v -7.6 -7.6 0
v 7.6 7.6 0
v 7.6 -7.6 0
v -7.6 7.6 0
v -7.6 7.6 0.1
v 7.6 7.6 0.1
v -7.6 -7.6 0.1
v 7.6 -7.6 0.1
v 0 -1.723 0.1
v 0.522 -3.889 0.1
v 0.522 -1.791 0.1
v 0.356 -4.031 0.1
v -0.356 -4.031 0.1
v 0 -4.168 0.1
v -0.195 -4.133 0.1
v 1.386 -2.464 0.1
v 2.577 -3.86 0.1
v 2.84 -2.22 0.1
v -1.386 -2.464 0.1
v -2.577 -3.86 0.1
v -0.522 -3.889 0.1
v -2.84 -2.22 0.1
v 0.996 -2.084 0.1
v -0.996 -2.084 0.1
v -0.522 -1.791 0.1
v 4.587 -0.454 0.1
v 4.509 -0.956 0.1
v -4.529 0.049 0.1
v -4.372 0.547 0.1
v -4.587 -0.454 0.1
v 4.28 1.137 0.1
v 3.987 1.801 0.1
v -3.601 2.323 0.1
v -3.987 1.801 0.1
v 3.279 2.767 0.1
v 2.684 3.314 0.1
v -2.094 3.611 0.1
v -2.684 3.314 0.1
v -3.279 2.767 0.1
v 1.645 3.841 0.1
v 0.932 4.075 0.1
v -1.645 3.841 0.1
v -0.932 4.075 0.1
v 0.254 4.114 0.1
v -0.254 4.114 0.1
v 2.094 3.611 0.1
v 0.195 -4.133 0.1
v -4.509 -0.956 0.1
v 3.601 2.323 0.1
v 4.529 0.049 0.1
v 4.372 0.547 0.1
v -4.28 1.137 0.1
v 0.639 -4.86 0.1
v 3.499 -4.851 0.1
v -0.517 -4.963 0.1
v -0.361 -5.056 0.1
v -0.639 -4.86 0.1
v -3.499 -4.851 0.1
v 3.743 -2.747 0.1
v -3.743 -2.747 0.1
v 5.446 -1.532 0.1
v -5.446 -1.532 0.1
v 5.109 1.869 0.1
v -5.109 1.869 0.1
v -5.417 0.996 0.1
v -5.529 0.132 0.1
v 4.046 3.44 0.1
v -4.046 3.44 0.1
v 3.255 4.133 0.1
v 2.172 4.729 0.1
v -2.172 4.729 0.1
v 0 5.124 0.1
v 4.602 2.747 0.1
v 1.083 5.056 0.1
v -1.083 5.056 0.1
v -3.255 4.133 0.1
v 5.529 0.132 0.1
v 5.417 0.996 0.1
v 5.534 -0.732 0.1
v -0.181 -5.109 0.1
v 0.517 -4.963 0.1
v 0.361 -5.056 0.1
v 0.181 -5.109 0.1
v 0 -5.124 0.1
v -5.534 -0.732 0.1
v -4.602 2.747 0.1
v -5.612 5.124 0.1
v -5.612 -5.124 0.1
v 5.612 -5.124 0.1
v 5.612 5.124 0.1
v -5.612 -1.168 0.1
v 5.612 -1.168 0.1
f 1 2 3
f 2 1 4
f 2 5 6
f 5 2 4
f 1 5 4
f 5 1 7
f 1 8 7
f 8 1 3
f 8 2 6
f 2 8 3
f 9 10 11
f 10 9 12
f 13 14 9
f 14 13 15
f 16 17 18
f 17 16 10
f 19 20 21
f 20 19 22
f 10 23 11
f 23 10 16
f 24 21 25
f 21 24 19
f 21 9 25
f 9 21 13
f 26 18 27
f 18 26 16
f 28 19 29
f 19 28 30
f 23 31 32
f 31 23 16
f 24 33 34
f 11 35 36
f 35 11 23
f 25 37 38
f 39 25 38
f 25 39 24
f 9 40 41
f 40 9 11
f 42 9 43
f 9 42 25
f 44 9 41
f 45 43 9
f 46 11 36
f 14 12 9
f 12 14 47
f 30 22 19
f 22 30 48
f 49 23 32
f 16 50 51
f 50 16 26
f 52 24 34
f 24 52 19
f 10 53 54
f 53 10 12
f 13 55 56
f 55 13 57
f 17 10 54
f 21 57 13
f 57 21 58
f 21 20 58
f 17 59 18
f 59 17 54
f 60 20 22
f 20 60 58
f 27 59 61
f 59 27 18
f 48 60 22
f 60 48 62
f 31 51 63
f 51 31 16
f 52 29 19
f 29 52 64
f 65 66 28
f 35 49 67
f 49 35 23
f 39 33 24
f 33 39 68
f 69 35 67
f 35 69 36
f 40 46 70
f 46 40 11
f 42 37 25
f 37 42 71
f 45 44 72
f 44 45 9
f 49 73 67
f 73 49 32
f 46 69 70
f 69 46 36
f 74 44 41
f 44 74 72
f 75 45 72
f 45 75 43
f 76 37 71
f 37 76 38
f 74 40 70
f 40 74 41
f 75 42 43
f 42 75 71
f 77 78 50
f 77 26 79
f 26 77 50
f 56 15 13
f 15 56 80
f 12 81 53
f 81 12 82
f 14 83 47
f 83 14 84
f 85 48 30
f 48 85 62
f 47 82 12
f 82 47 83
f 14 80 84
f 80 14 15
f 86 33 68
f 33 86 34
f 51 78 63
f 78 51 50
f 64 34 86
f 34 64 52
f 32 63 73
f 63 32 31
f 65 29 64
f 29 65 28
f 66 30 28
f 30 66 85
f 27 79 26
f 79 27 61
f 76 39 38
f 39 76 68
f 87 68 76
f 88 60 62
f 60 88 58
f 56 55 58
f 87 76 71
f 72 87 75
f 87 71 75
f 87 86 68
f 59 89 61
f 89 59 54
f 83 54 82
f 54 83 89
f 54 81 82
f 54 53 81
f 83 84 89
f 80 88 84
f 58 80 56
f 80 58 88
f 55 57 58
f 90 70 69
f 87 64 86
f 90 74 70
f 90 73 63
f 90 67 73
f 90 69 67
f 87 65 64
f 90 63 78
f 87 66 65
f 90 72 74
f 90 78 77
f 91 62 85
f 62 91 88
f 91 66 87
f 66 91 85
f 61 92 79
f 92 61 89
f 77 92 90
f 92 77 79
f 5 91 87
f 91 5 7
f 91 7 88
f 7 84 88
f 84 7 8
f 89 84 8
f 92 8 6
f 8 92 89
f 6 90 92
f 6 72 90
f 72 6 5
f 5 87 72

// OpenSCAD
// file: ../p/box5-12.scad
use <../lib.scad>
function ldraw_lib__box5_12() = [
// 0 Box with 5 Faces without Any Edges
// 0 Name: box5-12.dat
// 0 Author: Chris Dee [cwdee]
// 0 !LDRAW_ORG Primitive UPDATE 2009-02
// 0 !LICENSE Licensed under CC BY 2.0 and CC BY 4.0 : see CAreadme.txt
// 
// 0 BFC CERTIFY CCW
  [0,"BFC","CERTIFY"],
  [0,"BFC","CCW"],
// 
// 0 !HISTORY 2009-09-03 [PTadmin] Official Update 2009-02
// 
// 
// 4 16 1 1 1 1 1 -1 -1 1 -1 -1 1 1
  [4,16,1,1,1,1,1,-1,-1,1,-1,-1,1,1],
// 4 16 -1 0 1 1 0 1 1 1 1 -1 1 1
  [4,16,-1,0,1,1,0,1,1,1,1,-1,1,1],
// 4 16 -1 0 -1 -1 0 1 -1 1 1 -1 1 -1
  [4,16,-1,0,-1,-1,0,1,-1,1,1,-1,1,-1],
// 4 16 1 0 -1 -1 0 -1 -1 1 -1 1 1 -1
  [4,16,1,0,-1,-1,0,-1,-1,1,-1,1,1,-1],
// 4 16 1 0 1 1 0 -1 1 1 -1 1 1 1
  [4,16,1,0,1,1,0,-1,1,1,-1,1,1,1],
// 0
];
module ldraw_lib__box5_12(step=0, col=false, unit=2/5, alt=false, line=0.2, solid=!$preview)
    makepoly(ldraw_lib__box5_12(), step=step, col=col, unit=unit, alt=alt, line=line, solid=solid);
ldraw_lib__box5_12(line=0.2);
// file: 004695b.scad
use <../lib.scad>
use <../p/box5-12.scad>
use <s/3004s60.scad>
function ldraw_lib__004695b() = [
// 0 Sticker  1.9 x  1.9 with Shell Logo
// 0 Name: 004695b.dat
// 0 Author: J.C. Tchang [tchang]
// 0 !LDRAW_ORG Part UPDATE 2014-01
// 0 !LICENSE Licensed under CC BY 2.0 and CC BY 4.0 : see CAreadme.txt
// 
// 0 BFC CERTIFY CCW
  [0,"BFC","CERTIFY"],
  [0,"BFC","CCW"],
// 
// 0 !KEYWORDS Set 377
// 
// 0 !HISTORY 2014-06-21 [PTadmin] Official Update 2014-01
// 
// 
// 1 16 0 -0.25 0 19 0 0 0 0.25 0 0 0 19 box5-12.dat
  [1,16,0,-0.25,0,19,0,0,0,0.25,0,0,0,19, ldraw_lib__box5_12()],
// 1 15 0 -0.25 0 1.22 0 0 0 0 1 0 -1.22 0 s\3004s60.dat
  [1,15,0,-0.25,0,1.22,0,0,0,0,1,0,-1.22,0, ldraw_lib__s__3004s60()],
// 
// 4 15 -14.03 -0.25 -2.92068 -14.03 -0.25 12.81 -19 -0.25 19 -19 -0.25 -19
  [4,15,-14.03,-0.25,-2.92068,-14.03,-0.25,12.81,-19,-0.25,19,-19,-0.25,-19],
// 3 15 -14.03 -0.25 -2.92068 -19 -0.25 -19 -14.03 -0.25 -12.81
  [3,15,-14.03,-0.25,-2.92068,-19,-0.25,-19,-14.03,-0.25,-12.81],
// 4 15 0 -0.25 -12.81 -14.03 -0.25 -12.81 -19 -0.25 -19 19 -0.25 -19
  [4,15,0,-0.25,-12.81,-14.03,-0.25,-12.81,-19,-0.25,-19,19,-0.25,-19],
// 3 15 14.03 -0.25 -12.81 0 -0.25 -12.81 19 -0.25 -19
  [3,15,14.03,-0.25,-12.81,0,-0.25,-12.81,19,-0.25,-19],
// 4 15 14.03 -0.25 -2.92068 14.03 -0.25 -12.81 19 -0.25 -19 19 -0.25 19
  [4,15,14.03,-0.25,-2.92068,14.03,-0.25,-12.81,19,-0.25,-19,19,-0.25,19],
// 3 15 19 -0.25 19 14.03 -0.25 12.81 14.03 -0.25 -2.92068
  [3,15,19,-0.25,19,14.03,-0.25,12.81,14.03,-0.25,-2.92068],
// 4 15 0 -0.25 12.81 14.03 -0.25 12.81 19 -0.25 19 -19 -0.25 19
  [4,15,0,-0.25,12.81,14.03,-0.25,12.81,19,-0.25,19,-19,-0.25,19],
// 3 15 -19 -0.25 19 -14.03 -0.25 12.81 0 -0.25 12.81
  [3,15,-19,-0.25,19,-14.03,-0.25,12.81,0,-0.25,12.81],
];
module ldraw_lib__004695b(step=0, col=false, unit=2/5, alt=false, line=0.2, solid=!$preview)
    makepoly(ldraw_lib__004695b(), step=step, col=col, unit=unit, alt=alt, line=line, solid=solid);
ldraw_lib__004695b(line=0.2);
// main file
use <../lib.scad>
use <004695b.scad>
function ldraw_lib__190155j() = [
// 0 =Sticker 1.9 x 1.9 with Shell Logo
// 0 Name: 190155j.dat
// 0 Author: Vincent Messenet [Cheenzo]
// 0 !LDRAW_ORG Part Alias UPDATE 2022-06
// 0 !LICENSE Licensed under CC BY 2.0 and CC BY 4.0 : see CAreadme.txt
// 
// 0 BFC CERTIFY CCW
  [0,"BFC","CERTIFY"],
  [0,"BFC","CCW"],
// 
// 0 !KEYWORDS Bricklink 6378stk01, Brickowl 150076, Rebrickable 190155
// 0 !KEYWORDS Service station, Set 6378
// 
// 0 !HISTORY 2022-12-20 [PTadmin] Official Update 2022-06
// 
// 
// 0 // Alias of 004695b
// 1 16 0 0 0 1 0 0 0 1 0 0 0 1 004695b.dat
  [1,16,0,0,0,1,0,0,0,1,0,0,0,1, ldraw_lib__004695b()],
];
module ldraw_lib__190155j(step=0, col=false, unit=2/5, alt=false, line=0.2, solid=!$preview)
    makepoly(ldraw_lib__190155j(), step=step, col=col, unit=unit, alt=alt, line=line, solid=solid);
ldraw_lib__190155j(line=0.2);
